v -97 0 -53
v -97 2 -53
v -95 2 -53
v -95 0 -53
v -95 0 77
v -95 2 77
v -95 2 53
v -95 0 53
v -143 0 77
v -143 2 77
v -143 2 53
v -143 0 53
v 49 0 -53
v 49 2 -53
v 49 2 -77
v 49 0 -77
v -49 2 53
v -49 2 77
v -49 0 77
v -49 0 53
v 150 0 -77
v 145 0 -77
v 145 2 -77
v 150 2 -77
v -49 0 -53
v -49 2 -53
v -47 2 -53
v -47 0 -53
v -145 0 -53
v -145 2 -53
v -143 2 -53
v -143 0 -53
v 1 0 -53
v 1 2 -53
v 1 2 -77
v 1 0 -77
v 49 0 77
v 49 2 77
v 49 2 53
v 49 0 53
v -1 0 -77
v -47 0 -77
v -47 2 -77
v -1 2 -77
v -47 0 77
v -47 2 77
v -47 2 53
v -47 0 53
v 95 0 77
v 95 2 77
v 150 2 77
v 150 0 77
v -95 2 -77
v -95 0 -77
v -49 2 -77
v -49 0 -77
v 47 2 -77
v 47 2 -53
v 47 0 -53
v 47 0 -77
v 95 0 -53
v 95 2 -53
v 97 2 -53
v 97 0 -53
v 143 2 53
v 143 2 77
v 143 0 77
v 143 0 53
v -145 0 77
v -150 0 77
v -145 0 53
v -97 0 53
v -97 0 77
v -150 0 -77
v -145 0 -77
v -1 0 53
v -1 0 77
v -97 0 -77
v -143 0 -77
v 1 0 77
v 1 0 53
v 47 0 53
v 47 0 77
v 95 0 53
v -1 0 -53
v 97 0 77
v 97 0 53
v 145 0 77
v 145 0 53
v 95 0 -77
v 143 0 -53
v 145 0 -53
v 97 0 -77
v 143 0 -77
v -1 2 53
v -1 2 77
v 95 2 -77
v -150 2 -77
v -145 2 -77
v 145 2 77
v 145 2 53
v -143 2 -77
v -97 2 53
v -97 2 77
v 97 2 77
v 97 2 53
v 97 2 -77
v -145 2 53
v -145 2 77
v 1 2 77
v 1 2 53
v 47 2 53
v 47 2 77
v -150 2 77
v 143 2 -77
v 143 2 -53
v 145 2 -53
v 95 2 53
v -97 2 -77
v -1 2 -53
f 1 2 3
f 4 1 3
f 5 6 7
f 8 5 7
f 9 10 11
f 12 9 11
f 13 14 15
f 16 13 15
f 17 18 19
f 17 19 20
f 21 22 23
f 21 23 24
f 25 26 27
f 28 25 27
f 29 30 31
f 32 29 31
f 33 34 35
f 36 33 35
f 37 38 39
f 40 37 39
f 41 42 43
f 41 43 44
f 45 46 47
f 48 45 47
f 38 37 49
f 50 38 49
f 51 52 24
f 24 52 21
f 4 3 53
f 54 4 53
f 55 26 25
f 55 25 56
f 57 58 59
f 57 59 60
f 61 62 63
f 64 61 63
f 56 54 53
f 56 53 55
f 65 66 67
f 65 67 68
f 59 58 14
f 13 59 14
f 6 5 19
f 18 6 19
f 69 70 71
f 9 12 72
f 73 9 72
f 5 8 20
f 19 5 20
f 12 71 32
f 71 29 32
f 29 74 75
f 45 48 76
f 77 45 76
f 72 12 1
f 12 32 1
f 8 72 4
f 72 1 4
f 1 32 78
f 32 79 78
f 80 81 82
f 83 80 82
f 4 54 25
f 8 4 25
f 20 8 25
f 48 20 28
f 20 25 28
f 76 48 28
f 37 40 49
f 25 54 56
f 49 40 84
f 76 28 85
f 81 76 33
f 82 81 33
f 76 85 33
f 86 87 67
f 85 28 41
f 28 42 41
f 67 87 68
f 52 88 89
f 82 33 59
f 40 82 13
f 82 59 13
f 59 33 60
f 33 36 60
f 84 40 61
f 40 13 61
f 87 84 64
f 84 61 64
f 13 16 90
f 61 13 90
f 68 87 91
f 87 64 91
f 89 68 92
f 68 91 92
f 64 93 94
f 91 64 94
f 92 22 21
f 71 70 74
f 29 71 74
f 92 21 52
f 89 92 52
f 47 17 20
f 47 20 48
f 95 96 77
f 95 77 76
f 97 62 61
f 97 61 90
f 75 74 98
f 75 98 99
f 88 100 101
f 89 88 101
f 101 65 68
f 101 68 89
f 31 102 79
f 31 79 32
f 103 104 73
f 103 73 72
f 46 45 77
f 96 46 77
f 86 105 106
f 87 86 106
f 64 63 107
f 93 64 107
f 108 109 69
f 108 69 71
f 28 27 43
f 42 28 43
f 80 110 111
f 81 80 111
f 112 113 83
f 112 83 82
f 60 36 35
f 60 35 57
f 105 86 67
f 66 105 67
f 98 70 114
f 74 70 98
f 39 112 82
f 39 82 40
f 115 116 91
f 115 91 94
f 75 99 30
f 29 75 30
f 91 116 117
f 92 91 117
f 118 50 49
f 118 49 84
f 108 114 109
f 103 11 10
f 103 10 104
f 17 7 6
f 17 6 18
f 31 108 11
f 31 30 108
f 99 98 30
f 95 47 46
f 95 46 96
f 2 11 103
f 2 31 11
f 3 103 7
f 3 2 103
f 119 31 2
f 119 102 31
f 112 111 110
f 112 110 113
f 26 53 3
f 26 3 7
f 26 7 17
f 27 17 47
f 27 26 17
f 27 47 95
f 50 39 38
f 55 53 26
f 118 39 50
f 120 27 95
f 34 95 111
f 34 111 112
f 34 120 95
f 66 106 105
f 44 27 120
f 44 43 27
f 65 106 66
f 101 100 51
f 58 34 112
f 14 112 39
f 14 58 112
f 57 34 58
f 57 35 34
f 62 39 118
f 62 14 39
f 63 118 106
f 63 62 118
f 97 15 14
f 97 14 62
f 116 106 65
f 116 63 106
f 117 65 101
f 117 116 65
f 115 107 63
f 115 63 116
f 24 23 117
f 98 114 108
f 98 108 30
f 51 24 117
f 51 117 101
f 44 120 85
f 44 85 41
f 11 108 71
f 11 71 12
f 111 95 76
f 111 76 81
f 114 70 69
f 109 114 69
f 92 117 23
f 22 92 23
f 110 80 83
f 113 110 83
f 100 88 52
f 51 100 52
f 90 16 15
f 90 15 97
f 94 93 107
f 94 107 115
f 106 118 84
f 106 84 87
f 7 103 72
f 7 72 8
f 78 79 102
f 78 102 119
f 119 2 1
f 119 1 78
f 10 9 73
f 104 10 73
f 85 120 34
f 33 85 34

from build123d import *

# Parameters (mm, degrees)
SKETCH1_W               = 300
SKETCH1_H               = 154
BOSS_EXTRUDE1_DEPTH     = 2
CUT_EXTRUDE1_REACH      = 170.621
SKETCH2_W               = 2
SKETCH2_H               = 24
LPATTERN1_COUNT         = 7
LPATTERN1_PITCH         = 48
MIRROR1_COPY_1_REACH    = 170.621
MIRROR1_COPY_1_SKETCH_W = 2
MIRROR1_COPY_1_SKETCH_H = 24
MIRROR1_COPY_2_REACH    = 170.621
MIRROR1_COPY_2_SKETCH_W = 2
MIRROR1_COPY_2_SKETCH_H = 24
MIRROR1_COPY_3_REACH    = 170.621
MIRROR1_COPY_3_SKETCH_W = 2
MIRROR1_COPY_3_SKETCH_H = 24
MIRROR1_COPY_4_REACH    = 170.621
MIRROR1_COPY_4_SKETCH_W = 2
MIRROR1_COPY_4_SKETCH_H = 24
MIRROR1_COPY_5_REACH    = 170.621
MIRROR1_COPY_5_SKETCH_W = 2
MIRROR1_COPY_5_SKETCH_H = 24
MIRROR1_COPY_6_REACH    = 170.621
MIRROR1_COPY_6_SKETCH_W = 2
MIRROR1_COPY_6_SKETCH_H = 24


with BuildPart() as part:
    # Sketch1 → Boss-Extrude1 (new body)
    with BuildSketch(Plane(origin=(0, 0, 0), x_dir=(1, 0, 0), z_dir=(0, 1, 0))):
        Rectangle(SKETCH1_W, SKETCH1_H)
    extrude(amount=BOSS_EXTRUDE1_DEPTH)

    # Sketch2 → Cut-Extrude1 (cut, up to next)
    with BuildSketch(Plane(origin=(0, 2, 0), x_dir=(1, 0, 0), z_dir=(0, 1, 0)), mode=Mode.PRIVATE) as cut_extrude1_sk1:
        with Locations((-144, -65)):
            Rectangle(SKETCH2_W, SKETCH2_H)
    cut_extrude1_tool1 = extrude(cut_extrude1_sk1.sketch, amount=-CUT_EXTRUDE1_REACH, mode=Mode.PRIVATE) & part.part
    cut_extrude1 = cut_extrude1_tool1.solids().sort_by_distance((-144, 2, 65))[0]
    add(cut_extrude1, mode=Mode.SUBTRACT)

    # LPattern1: Cut-Extrude1 ×7
    with Locations(*[(i * LPATTERN1_PITCH, 0, 0) for i in range(1, LPATTERN1_COUNT)]):
        add(cut_extrude1, mode=Mode.SUBTRACT)

    # Mirror1: Cut-Extrude1 across plane
    add(cut_extrude1.mirror(Plane.XY), mode=Mode.SUBTRACT)

    # Mirror1 copy 1 sketch → Mirror1 copy 1 (cut, up to next)
    with BuildSketch(Plane(origin=(48, 2, 0), x_dir=(1, 0, 0), z_dir=(0, 1, 0)), mode=Mode.PRIVATE) as mirror1_copy_1_sk1:
        with Locations((-144, 65)):
            Rectangle(MIRROR1_COPY_1_SKETCH_W, MIRROR1_COPY_1_SKETCH_H)
    mirror1_copy_1_tool1 = extrude(mirror1_copy_1_sk1.sketch, amount=-MIRROR1_COPY_1_REACH, mode=Mode.PRIVATE) & part.part
    add(mirror1_copy_1_tool1.solids().sort_by_distance((-96, 2, -65))[0], mode=Mode.SUBTRACT)

    # Mirror1 copy 2 sketch → Mirror1 copy 2 (cut, up to next)
    with BuildSketch(Plane(origin=(96, 2, 0), x_dir=(1, 0, 0), z_dir=(0, 1, 0)), mode=Mode.PRIVATE) as mirror1_copy_2_sk1:
        with Locations((-144, 65)):
            Rectangle(MIRROR1_COPY_2_SKETCH_W, MIRROR1_COPY_2_SKETCH_H)
    mirror1_copy_2_tool1 = extrude(mirror1_copy_2_sk1.sketch, amount=-MIRROR1_COPY_2_REACH, mode=Mode.PRIVATE) & part.part
    add(mirror1_copy_2_tool1.solids().sort_by_distance((-48, 2, -65))[0], mode=Mode.SUBTRACT)

    # Mirror1 copy 3 sketch → Mirror1 copy 3 (cut, up to next)
    with BuildSketch(Plane(origin=(144, 2, 0), x_dir=(1, 0, 0), z_dir=(0, 1, 0)), mode=Mode.PRIVATE) as mirror1_copy_3_sk1:
        with Locations((-144, 65)):
            Rectangle(MIRROR1_COPY_3_SKETCH_W, MIRROR1_COPY_3_SKETCH_H)
    mirror1_copy_3_tool1 = extrude(mirror1_copy_3_sk1.sketch, amount=-MIRROR1_COPY_3_REACH, mode=Mode.PRIVATE) & part.part
    add(mirror1_copy_3_tool1.solids().sort_by_distance((0, 2, -65))[0], mode=Mode.SUBTRACT)

    # Mirror1 copy 4 sketch → Mirror1 copy 4 (cut, up to next)
    with BuildSketch(Plane(origin=(192, 2, 0), x_dir=(1, 0, 0), z_dir=(0, 1, 0)), mode=Mode.PRIVATE) as mirror1_copy_4_sk1:
        with Locations((-144, 65)):
            Rectangle(MIRROR1_COPY_4_SKETCH_W, MIRROR1_COPY_4_SKETCH_H)
    mirror1_copy_4_tool1 = extrude(mirror1_copy_4_sk1.sketch, amount=-MIRROR1_COPY_4_REACH, mode=Mode.PRIVATE) & part.part
    add(mirror1_copy_4_tool1.solids().sort_by_distance((48, 2, -65))[0], mode=Mode.SUBTRACT)

    # Mirror1 copy 5 sketch → Mirror1 copy 5 (cut, up to next)
    with BuildSketch(Plane(origin=(240, 2, 0), x_dir=(1, 0, 0), z_dir=(0, 1, 0)), mode=Mode.PRIVATE) as mirror1_copy_5_sk1:
        with Locations((-144, 65)):
            Rectangle(MIRROR1_COPY_5_SKETCH_W, MIRROR1_COPY_5_SKETCH_H)
    mirror1_copy_5_tool1 = extrude(mirror1_copy_5_sk1.sketch, amount=-MIRROR1_COPY_5_REACH, mode=Mode.PRIVATE) & part.part
    add(mirror1_copy_5_tool1.solids().sort_by_distance((96, 2, -65))[0], mode=Mode.SUBTRACT)

    # Mirror1 copy 6 sketch → Mirror1 copy 6 (cut, up to next)
    with BuildSketch(Plane(origin=(288, 2, 0), x_dir=(1, 0, 0), z_dir=(0, 1, 0)), mode=Mode.PRIVATE) as mirror1_copy_6_sk1:
        with Locations((-144, 65)):
            Rectangle(MIRROR1_COPY_6_SKETCH_W, MIRROR1_COPY_6_SKETCH_H)
    mirror1_copy_6_tool1 = extrude(mirror1_copy_6_sk1.sketch, amount=-MIRROR1_COPY_6_REACH, mode=Mode.PRIVATE) & part.part
    add(mirror1_copy_6_tool1.solids().sort_by_distance((144, 2, -65))[0], mode=Mode.SUBTRACT)


solid = part.part
